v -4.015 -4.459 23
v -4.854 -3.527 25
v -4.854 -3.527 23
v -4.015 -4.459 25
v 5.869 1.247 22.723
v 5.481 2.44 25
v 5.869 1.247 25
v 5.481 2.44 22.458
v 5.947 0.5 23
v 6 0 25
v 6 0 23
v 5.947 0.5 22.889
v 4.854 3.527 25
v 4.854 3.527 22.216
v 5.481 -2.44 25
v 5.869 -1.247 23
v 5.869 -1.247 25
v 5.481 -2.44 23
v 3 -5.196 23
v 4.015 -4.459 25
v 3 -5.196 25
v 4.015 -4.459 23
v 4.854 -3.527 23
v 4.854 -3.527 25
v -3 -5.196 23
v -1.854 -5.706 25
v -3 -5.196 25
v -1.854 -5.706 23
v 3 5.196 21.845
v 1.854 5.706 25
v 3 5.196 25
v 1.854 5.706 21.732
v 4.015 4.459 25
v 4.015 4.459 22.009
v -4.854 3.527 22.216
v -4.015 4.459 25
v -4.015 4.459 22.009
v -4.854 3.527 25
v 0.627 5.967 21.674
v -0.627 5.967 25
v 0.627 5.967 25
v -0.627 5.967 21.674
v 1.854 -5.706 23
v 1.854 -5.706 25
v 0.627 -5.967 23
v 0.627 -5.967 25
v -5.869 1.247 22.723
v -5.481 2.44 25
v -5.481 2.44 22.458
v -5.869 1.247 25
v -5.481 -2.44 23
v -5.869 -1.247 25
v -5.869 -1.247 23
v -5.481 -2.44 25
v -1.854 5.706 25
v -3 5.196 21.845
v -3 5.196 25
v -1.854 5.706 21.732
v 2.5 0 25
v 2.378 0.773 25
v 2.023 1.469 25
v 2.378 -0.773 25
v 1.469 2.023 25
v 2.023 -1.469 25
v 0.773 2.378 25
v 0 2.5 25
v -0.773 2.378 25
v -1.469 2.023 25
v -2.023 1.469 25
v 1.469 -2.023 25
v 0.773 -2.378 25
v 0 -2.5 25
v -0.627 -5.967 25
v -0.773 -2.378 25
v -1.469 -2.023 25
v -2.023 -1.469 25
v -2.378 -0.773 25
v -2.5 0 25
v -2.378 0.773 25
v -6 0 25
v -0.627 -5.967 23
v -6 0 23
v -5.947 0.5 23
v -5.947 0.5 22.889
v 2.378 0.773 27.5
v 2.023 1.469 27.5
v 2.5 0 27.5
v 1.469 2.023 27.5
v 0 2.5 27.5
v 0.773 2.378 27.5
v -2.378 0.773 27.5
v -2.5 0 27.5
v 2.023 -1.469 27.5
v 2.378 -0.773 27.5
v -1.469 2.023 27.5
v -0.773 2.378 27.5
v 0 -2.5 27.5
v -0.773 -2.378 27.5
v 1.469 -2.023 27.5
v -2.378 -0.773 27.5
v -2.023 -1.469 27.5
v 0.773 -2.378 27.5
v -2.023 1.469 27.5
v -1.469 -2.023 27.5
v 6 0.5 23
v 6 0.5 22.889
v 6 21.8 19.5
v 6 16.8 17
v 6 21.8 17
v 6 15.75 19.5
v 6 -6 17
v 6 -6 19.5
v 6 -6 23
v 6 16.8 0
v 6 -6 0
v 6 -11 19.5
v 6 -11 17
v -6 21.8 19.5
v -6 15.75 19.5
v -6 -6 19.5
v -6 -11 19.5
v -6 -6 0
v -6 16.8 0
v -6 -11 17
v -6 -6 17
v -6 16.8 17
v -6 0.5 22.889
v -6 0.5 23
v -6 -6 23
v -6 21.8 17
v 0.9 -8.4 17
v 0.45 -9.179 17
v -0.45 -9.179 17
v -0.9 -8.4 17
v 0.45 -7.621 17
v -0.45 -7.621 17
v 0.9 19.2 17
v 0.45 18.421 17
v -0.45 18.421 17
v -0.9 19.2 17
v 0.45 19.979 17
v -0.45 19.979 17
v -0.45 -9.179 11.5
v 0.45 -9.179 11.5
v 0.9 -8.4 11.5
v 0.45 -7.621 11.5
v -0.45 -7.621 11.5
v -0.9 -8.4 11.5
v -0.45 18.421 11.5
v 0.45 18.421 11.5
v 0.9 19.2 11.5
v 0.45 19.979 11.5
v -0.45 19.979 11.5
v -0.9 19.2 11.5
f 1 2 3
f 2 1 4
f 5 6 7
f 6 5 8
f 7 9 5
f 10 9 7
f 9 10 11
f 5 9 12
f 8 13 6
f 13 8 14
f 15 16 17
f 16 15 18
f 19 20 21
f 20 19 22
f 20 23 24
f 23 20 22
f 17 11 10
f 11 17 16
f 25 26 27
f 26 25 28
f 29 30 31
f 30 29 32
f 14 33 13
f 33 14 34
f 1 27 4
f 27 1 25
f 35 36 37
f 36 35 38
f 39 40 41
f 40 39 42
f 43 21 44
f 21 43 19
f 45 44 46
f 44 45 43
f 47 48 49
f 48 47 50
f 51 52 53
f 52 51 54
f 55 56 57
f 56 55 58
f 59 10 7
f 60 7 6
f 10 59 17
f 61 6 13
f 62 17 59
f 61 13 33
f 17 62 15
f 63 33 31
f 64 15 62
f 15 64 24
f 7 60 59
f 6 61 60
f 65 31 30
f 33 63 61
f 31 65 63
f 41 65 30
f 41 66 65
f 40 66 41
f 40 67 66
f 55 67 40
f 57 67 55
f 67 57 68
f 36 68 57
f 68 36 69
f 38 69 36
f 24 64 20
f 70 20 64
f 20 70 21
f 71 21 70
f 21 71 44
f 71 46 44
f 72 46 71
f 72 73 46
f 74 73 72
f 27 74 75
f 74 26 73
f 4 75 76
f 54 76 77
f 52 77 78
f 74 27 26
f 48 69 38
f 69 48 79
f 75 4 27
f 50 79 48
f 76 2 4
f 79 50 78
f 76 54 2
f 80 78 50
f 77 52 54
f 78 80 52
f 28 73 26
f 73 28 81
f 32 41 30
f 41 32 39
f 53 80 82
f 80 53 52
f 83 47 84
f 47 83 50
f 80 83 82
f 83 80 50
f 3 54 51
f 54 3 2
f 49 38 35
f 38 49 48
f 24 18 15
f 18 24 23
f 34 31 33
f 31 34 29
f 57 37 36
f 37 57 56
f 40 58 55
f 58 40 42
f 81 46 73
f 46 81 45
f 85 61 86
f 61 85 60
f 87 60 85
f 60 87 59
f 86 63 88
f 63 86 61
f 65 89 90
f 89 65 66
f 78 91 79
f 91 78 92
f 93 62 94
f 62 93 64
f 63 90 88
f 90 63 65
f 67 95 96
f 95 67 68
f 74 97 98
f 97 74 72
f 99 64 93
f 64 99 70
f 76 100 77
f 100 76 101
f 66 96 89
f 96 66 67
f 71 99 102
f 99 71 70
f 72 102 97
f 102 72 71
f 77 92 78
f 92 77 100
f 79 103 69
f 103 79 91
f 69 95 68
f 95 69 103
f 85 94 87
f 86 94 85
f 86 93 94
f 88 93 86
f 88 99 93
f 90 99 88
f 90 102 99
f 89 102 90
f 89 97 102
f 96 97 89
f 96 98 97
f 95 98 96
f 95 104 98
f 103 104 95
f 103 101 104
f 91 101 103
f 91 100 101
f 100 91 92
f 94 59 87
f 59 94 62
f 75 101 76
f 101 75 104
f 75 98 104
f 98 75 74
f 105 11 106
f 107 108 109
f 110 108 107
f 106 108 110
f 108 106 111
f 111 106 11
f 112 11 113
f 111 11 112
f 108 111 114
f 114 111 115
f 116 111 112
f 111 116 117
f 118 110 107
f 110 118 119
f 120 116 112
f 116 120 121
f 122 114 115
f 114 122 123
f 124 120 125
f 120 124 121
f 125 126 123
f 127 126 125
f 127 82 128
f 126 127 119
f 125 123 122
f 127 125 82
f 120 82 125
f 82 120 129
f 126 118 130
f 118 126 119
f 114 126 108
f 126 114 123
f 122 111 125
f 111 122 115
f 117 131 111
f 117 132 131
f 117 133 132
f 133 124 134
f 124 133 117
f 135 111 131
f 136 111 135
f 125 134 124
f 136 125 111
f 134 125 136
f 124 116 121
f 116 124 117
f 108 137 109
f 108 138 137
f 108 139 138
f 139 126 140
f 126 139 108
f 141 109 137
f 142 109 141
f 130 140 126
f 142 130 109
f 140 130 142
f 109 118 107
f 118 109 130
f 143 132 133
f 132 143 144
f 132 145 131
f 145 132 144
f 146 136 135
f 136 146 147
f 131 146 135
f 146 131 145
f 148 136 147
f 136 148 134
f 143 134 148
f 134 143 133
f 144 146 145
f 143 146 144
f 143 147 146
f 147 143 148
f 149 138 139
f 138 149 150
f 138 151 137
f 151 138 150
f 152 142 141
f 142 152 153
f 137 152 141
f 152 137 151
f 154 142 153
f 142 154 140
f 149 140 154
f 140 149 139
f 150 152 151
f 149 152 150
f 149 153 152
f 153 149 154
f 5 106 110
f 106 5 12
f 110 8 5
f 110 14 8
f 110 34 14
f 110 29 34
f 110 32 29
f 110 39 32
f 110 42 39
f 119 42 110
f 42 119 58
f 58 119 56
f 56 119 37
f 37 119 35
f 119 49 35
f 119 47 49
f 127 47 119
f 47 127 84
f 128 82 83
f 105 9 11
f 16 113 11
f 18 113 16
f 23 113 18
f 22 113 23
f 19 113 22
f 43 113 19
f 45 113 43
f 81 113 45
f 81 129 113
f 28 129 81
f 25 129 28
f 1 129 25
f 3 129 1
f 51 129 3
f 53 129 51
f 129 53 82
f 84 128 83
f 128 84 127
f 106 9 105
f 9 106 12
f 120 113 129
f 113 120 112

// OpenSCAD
// file: triangles.scad
/**
 * Simple triangles library
 *
 * Authors:
 *   - Eero 'rambo' af Heurlin 2010-
 *
 * License: LGPL 2.1
 */


/**
 * Standard right-angled triangle
 *
 * @param number o_len Lenght of the opposite side
 * @param number a_len Lenght of the adjacent side
 * @param number depth How wide/deep the triangle is in the 3rd dimension
 */
/*
module triangle(o_len, a_len, depth)
{
	difference()
	{
		cube([depth, a_len, o_len], center=false);
		rotate([atan(o_len/a_len),0,0])
		{
			translate([-2.5,0,0])
			{
				cube([depth+5,sqrt(pow(a_len, 2) + pow(o_len,2))+2, o_len+2], center=false);
			}
		}
	}
}

# triangle(5,10,7);
*/


/**
 * Standard right-angled triangle
 *
 * @param number o_len Lenght of the opposite side
 * @param number a_len Lenght of the adjacent side
 * @param number depth How wide/deep the triangle is in the 3rd dimension
 * @todo a better way ?
 */
module triangle(o_len, a_len, depth)
{
    linear_extrude(height=depth)
    {
        polygon(points=[[0,0],[a_len,0],[0,o_len]], paths=[[0,1,2]]);
    }
}

triangle(5,10,7);
// main file
/**
 * Servo outline library
 *
 * Authors:
 *   - Eero 'rambo' af Heurlin 2010-
 *
 * License: LGPL 2.1
 */

use <triangles.scad>

/**
 * Align DS420 digital servo
 *
 * @param vector position The position vector
 * @param vector rotation The rotation vector
 * @param boolean screws If defined then "screws" will be added and when the module is differenced() from something if will have holes for the screws
 * @param number axle_lenght If defined this will draw "backgound" indicator for the main axle
 */
module alignds420(position, rotation, screws = 0, axle_lenght = 0)
{
	translate(position)
	{
		rotate(rotation)
	    {
			union()
			{
				// Main axle
				translate([0,0,17])
				{
					cylinder(r=6, h=8, $fn=30);
					cylinder(r=2.5, h=10.5, $fn=20);
				}
				// Box and ears
				translate([-6,-6,0])
				{
					cube([12, 22.8,19.5], false);
					translate([0,-5, 17])
					{
						cube([12, 7, 2.5]);
					}
					translate([0, 20.8, 17])
					{
						cube([12, 7, 2.5]);
					}
				}
				if (screws > 0)
				{
					translate([0,(-10.2 + 1.8),11.5])
					{
						# cylinder(r=1.8/2, h=6, $fn=6);
					}
					translate([0,(21.0 - 1.8),11.5])
					{
						# cylinder(r=1.8/2, h=6, $fn=6);
					}

				}
				// The large slope
				translate([-6,0,19])
				{
					rotate([90,0,90])
					{
						triangle(4, 18, 12);
					}
				}

				/**
				 * This seems to get too complex fast
				// Small additional axes
				translate([0,6,17])
				{
					cylinder(r=2.5, h=6, $fn=10);
					cylinder(r=1.25, h=8, $fn=10);
				}
				// Small slope
				difference()
				{
					translate([-6,-6,19.0])
					{
						cube([12,6.5,4]);
					}
					translate([7,-7,24.0])
					{
						rotate([-90,0,90])
						{
				            triangle(3, 8, 14);
						}
					}

				}
				*/
				// So we render a cube instead of the small slope on a cube
				translate([-6,-6,19.0])
				{
					cube([12,6.5,4]);
				}
			}
			if (axle_lenght > 0)
			{
				% cylinder(r=0.9, h=axle_lenght, center=true, $fn=8);
			}
		}
	}
}

// Example, uncomment to test
alignds420(screws=1);
